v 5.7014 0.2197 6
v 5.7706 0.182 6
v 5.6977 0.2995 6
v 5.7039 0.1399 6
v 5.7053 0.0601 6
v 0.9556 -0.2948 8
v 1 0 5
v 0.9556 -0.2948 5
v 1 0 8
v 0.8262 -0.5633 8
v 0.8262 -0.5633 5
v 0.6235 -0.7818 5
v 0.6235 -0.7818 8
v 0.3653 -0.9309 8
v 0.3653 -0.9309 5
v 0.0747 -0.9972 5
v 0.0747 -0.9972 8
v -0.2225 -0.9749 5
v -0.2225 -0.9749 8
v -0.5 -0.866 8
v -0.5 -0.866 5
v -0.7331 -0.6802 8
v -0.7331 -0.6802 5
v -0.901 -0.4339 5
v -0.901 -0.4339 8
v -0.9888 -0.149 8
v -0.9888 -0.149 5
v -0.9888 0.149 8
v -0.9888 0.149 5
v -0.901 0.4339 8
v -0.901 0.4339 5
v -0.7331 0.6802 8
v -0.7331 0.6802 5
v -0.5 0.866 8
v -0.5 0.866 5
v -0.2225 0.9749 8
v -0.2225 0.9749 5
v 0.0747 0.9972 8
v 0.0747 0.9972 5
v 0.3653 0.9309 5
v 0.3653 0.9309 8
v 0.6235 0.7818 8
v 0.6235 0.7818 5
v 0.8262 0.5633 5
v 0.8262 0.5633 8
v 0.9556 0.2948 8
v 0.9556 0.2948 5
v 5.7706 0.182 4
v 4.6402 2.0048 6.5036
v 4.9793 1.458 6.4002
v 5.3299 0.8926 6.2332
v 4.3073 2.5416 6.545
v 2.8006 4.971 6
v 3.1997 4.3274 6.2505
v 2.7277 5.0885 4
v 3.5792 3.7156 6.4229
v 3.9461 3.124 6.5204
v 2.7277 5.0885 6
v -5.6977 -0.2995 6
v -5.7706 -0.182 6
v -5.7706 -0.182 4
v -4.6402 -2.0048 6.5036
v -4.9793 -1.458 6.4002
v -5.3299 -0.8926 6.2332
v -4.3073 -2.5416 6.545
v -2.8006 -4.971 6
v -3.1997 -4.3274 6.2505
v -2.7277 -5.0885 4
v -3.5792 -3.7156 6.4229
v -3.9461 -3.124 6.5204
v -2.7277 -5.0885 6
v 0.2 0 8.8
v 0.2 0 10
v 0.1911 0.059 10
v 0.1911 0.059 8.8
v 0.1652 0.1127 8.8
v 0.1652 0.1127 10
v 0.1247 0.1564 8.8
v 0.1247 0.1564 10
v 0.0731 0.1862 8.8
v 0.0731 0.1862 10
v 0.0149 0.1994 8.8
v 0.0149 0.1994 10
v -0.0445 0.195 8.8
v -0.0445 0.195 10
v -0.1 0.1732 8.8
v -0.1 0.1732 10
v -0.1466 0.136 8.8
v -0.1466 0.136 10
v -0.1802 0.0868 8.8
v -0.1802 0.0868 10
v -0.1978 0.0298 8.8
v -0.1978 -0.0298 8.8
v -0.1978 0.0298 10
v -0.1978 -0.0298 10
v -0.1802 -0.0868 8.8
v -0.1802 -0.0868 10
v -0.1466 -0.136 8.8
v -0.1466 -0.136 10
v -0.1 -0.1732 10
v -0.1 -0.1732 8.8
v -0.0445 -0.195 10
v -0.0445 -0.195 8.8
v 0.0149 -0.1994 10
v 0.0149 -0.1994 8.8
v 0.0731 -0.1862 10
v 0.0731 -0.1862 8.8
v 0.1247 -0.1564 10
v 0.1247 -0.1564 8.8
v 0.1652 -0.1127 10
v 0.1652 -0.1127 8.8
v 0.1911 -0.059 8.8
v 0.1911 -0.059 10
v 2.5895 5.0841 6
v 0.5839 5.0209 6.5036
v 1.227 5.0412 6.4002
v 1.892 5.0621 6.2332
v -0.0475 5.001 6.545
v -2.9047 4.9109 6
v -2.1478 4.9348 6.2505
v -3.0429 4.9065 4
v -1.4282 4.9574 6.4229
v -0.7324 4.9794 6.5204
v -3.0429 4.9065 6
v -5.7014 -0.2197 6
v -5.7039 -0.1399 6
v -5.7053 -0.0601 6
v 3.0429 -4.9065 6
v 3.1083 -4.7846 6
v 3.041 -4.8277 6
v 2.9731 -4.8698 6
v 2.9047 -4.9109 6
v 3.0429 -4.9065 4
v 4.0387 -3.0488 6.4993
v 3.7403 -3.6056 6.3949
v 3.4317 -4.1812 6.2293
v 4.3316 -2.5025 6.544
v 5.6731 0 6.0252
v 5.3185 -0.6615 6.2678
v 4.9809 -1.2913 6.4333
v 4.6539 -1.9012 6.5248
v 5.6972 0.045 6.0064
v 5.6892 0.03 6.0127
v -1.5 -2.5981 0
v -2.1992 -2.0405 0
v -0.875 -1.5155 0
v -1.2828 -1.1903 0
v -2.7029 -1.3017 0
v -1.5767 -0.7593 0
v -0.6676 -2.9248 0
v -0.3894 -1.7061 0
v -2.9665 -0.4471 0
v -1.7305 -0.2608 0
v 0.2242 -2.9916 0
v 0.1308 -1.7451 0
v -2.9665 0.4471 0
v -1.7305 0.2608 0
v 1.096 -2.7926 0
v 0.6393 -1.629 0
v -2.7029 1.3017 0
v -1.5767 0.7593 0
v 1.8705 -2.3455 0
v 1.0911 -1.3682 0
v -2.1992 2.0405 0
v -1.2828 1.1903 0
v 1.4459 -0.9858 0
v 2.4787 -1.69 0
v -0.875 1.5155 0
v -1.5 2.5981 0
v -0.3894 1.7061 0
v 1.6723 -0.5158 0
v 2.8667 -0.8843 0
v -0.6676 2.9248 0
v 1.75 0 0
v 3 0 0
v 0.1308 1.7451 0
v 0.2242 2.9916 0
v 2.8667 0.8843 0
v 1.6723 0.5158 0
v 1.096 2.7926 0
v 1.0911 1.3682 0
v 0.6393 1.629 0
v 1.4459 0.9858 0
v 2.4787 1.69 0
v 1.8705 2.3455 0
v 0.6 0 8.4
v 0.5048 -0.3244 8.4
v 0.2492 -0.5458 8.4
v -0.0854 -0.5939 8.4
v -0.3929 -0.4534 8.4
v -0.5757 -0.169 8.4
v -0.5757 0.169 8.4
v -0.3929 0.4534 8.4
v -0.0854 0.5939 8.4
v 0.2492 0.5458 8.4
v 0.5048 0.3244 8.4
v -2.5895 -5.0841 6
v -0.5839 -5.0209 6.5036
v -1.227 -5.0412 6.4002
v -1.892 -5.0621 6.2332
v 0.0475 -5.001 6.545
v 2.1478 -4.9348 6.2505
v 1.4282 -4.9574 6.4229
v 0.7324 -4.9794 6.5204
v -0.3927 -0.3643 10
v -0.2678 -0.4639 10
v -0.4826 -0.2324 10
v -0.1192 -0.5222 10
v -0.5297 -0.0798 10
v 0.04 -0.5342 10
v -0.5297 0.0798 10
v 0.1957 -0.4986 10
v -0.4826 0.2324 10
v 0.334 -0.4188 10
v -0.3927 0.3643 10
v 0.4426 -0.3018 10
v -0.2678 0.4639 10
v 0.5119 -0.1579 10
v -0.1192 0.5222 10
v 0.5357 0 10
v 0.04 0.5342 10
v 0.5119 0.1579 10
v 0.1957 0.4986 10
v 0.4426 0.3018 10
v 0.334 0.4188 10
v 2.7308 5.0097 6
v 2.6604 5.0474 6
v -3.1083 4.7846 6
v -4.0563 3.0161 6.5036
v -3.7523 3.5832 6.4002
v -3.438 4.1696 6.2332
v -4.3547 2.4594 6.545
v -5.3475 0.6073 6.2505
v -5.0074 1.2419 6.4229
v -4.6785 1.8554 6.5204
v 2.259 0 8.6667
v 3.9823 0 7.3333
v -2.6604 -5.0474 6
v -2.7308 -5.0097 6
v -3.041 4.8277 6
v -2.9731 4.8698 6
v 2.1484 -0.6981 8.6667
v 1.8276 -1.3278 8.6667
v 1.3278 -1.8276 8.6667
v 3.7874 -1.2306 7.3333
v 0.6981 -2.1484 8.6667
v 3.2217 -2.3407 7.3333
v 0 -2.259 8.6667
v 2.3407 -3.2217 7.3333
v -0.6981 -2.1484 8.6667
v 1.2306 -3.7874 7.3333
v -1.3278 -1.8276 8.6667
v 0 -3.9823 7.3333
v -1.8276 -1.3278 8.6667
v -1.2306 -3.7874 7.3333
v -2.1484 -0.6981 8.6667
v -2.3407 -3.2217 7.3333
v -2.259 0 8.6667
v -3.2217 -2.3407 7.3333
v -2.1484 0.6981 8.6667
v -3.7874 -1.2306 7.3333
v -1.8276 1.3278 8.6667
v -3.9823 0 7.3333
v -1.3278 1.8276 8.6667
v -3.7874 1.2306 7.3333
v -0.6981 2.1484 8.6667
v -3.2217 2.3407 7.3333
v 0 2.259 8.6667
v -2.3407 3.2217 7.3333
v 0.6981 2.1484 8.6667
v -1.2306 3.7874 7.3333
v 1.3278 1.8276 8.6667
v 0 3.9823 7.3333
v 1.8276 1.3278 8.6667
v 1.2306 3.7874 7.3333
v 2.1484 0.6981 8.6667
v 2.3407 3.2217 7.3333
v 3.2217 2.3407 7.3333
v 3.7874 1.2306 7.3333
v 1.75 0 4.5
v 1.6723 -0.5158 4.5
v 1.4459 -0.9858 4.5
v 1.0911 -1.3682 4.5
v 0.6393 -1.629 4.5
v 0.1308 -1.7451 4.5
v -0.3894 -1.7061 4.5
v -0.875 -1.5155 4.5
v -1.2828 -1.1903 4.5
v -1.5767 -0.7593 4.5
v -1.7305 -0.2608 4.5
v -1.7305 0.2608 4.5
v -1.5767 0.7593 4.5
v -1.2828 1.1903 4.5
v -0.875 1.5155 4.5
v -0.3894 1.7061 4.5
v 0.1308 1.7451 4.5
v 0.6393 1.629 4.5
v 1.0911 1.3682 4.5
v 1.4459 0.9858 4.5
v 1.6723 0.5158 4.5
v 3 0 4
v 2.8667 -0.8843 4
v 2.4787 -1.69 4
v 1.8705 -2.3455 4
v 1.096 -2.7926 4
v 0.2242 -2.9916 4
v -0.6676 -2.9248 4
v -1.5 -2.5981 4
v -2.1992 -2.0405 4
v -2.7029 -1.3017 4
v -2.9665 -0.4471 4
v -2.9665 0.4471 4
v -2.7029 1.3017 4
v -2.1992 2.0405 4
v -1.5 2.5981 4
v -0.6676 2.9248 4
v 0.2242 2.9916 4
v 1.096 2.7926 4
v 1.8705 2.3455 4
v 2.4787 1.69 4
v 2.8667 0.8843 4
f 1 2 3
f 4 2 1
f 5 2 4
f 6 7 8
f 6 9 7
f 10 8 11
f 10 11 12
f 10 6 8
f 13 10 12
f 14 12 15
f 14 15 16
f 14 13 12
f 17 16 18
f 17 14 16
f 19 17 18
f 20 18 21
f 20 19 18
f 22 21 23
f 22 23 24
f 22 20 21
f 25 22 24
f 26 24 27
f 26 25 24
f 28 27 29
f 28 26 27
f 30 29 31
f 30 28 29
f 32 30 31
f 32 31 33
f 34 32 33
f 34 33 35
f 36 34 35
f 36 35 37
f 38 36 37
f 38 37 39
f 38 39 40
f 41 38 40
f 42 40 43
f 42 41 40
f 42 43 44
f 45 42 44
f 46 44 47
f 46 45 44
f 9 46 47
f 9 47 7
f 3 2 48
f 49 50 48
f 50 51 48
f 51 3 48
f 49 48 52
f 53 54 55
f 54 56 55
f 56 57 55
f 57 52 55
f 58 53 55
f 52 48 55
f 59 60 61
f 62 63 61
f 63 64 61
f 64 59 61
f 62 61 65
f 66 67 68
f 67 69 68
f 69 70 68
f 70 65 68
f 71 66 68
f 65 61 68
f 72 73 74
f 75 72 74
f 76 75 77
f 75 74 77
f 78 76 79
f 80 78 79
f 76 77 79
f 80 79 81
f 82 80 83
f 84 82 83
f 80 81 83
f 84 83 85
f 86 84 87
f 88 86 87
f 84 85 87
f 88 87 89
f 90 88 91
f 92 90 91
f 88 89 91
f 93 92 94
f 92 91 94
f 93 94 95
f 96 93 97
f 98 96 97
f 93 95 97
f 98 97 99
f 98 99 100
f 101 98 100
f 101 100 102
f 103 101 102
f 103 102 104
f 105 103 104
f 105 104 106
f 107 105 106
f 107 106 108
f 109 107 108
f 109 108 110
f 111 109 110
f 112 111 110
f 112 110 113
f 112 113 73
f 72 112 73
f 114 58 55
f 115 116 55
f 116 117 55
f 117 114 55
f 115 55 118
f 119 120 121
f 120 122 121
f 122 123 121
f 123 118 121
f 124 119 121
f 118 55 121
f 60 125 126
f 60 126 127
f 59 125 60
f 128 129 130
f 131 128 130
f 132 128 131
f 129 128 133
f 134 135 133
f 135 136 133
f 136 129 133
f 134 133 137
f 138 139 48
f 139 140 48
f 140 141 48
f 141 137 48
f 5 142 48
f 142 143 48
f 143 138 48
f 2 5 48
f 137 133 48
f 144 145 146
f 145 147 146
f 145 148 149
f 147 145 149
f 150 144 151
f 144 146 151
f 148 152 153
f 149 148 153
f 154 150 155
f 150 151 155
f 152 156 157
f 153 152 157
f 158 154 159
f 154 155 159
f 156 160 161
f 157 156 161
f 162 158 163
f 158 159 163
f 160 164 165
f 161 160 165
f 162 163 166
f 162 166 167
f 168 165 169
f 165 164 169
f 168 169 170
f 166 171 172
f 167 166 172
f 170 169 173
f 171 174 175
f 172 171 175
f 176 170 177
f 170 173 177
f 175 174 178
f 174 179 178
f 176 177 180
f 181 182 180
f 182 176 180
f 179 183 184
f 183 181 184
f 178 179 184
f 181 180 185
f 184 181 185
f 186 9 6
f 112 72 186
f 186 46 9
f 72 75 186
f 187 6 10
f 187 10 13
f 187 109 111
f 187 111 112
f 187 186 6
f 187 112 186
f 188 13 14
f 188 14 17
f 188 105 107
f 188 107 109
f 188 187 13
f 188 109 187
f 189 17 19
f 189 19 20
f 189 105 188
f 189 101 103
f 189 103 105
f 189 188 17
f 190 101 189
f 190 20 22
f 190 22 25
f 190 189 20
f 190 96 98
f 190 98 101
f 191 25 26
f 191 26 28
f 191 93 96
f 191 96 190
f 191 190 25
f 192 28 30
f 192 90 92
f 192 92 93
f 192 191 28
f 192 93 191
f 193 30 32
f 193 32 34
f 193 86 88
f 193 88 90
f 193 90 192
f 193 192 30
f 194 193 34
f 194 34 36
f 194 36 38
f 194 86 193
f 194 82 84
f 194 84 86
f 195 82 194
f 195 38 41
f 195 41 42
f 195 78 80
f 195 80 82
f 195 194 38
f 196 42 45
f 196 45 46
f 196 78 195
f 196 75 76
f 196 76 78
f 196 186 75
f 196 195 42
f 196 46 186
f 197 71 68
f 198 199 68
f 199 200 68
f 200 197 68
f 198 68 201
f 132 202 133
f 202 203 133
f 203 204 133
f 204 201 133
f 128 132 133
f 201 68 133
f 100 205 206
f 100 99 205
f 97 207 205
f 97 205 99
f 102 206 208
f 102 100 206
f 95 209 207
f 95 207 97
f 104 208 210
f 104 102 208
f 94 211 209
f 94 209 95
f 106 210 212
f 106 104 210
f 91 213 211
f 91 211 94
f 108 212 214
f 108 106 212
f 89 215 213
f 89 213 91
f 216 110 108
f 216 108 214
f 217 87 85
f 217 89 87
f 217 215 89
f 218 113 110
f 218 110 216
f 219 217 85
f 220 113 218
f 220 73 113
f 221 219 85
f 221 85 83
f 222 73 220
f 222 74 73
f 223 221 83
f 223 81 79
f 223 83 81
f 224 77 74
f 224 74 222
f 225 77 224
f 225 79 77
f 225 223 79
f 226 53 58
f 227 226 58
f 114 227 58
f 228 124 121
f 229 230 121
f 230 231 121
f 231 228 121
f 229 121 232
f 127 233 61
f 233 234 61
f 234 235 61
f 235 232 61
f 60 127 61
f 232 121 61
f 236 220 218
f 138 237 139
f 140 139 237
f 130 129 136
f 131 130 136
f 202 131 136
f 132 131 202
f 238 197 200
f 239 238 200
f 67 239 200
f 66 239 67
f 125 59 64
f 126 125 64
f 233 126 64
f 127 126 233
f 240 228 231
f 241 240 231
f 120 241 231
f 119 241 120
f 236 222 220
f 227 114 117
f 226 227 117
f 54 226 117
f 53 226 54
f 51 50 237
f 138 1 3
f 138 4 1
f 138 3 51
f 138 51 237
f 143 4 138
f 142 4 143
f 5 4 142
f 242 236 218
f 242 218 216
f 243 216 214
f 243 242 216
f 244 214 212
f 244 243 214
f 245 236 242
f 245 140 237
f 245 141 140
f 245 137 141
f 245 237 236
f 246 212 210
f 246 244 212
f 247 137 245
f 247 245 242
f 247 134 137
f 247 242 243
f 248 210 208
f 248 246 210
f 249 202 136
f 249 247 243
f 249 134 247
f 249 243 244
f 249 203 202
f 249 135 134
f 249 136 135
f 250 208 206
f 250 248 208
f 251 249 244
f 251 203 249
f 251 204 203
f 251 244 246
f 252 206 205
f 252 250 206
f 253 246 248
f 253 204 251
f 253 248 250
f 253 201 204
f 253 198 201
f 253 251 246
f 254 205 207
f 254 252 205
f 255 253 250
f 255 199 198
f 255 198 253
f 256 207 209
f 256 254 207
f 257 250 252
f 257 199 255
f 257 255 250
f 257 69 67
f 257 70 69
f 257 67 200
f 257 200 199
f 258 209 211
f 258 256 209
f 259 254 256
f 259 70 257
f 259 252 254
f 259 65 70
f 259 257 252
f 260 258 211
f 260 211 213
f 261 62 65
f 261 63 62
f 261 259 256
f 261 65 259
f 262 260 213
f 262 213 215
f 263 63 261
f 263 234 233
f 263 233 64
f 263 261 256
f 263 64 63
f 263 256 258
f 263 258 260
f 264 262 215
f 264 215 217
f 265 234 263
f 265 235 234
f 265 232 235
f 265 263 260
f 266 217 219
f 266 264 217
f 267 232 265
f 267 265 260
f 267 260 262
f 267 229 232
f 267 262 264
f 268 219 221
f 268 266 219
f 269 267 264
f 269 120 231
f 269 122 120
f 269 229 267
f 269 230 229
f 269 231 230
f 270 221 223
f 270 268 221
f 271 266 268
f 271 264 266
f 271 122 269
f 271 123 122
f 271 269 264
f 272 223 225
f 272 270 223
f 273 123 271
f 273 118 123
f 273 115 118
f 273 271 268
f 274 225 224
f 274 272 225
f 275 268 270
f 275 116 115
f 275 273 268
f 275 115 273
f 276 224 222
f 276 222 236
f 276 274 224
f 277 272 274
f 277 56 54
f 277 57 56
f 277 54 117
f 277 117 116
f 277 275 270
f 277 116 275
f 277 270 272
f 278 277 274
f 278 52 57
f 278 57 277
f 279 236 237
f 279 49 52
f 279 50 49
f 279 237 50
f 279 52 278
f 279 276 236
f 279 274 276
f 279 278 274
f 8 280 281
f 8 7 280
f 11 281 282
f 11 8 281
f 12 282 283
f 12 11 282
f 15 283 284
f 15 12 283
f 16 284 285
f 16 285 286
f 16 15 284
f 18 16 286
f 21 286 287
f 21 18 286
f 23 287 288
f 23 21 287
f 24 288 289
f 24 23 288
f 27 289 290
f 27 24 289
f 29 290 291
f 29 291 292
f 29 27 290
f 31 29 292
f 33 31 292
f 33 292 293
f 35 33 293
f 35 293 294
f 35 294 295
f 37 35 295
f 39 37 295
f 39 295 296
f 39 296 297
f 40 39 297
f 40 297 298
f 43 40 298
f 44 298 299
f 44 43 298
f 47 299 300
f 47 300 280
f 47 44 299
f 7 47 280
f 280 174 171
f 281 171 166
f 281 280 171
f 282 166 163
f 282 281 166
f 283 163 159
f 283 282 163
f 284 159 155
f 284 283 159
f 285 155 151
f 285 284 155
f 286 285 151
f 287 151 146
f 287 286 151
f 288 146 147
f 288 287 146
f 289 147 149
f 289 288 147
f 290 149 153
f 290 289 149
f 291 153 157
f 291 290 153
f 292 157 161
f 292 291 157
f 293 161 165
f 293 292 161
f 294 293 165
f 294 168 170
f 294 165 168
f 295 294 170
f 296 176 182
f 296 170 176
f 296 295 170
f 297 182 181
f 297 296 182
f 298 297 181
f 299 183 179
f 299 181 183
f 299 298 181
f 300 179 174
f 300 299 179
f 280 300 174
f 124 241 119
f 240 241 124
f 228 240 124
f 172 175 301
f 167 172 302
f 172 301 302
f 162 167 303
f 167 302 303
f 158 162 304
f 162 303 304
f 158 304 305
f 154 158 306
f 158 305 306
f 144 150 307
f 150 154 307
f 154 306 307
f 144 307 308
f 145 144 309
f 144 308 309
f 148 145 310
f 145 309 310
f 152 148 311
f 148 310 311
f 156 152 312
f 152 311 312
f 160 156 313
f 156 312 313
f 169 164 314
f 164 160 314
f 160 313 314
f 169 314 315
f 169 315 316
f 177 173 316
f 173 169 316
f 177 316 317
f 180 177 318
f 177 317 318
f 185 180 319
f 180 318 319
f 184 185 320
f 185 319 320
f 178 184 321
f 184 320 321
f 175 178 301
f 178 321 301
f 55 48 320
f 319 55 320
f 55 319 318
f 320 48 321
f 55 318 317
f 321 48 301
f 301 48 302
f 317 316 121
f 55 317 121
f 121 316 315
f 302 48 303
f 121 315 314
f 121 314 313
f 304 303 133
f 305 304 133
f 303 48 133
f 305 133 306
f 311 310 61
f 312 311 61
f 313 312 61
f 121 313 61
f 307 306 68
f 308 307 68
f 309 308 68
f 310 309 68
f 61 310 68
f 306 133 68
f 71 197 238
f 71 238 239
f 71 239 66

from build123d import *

# Parameters (mm, degrees)
F1_DEPTH = 10
F2_W     = 4.670898
F2_H     = 6.321549
F4_R     = 0.2
F5_DEPTH = 10.001


with BuildPart() as f1:
    # F0 (on Top) → F1 (new body)
    with BuildSketch(Plane.XY):
        Polygon((5.770634, 0.18198), (2.727718, 5.088505), (-3.042916, 4.906526), (-5.770634, -0.18198), (-2.727718, -5.088505), (3.042916, -4.906526), align=None)
    extrude(amount=F1_DEPTH)

    # F2 (on Front) → F3 (revolve, cut)
    with BuildSketch(Plane.XZ):
        with Locations((5.335449, 0.839225)):
            Rectangle(F2_W, F2_H)
        Polygon((0.4, 10.880456), (0.4, 10.104967), (5.705611, 6), (7.525738, 6), (7.525738, 10.880456), align=None)
        Polygon((0, 9), (0, -1.974234), (1.75, -1.974234), (1.75, 4.5), (1, 5), (1, 8), align=None)
    revolve(axis=Axis((0, 0, 3.313374), (0, 0, -1)), mode=Mode.SUBTRACT)

    # F4 (on face) → F5 (cut, through all)
    with BuildSketch(Plane.XY.offset(10)):
        Circle(F4_R)
    extrude(amount=-F5_DEPTH, mode=Mode.SUBTRACT)


solid = f1.part
